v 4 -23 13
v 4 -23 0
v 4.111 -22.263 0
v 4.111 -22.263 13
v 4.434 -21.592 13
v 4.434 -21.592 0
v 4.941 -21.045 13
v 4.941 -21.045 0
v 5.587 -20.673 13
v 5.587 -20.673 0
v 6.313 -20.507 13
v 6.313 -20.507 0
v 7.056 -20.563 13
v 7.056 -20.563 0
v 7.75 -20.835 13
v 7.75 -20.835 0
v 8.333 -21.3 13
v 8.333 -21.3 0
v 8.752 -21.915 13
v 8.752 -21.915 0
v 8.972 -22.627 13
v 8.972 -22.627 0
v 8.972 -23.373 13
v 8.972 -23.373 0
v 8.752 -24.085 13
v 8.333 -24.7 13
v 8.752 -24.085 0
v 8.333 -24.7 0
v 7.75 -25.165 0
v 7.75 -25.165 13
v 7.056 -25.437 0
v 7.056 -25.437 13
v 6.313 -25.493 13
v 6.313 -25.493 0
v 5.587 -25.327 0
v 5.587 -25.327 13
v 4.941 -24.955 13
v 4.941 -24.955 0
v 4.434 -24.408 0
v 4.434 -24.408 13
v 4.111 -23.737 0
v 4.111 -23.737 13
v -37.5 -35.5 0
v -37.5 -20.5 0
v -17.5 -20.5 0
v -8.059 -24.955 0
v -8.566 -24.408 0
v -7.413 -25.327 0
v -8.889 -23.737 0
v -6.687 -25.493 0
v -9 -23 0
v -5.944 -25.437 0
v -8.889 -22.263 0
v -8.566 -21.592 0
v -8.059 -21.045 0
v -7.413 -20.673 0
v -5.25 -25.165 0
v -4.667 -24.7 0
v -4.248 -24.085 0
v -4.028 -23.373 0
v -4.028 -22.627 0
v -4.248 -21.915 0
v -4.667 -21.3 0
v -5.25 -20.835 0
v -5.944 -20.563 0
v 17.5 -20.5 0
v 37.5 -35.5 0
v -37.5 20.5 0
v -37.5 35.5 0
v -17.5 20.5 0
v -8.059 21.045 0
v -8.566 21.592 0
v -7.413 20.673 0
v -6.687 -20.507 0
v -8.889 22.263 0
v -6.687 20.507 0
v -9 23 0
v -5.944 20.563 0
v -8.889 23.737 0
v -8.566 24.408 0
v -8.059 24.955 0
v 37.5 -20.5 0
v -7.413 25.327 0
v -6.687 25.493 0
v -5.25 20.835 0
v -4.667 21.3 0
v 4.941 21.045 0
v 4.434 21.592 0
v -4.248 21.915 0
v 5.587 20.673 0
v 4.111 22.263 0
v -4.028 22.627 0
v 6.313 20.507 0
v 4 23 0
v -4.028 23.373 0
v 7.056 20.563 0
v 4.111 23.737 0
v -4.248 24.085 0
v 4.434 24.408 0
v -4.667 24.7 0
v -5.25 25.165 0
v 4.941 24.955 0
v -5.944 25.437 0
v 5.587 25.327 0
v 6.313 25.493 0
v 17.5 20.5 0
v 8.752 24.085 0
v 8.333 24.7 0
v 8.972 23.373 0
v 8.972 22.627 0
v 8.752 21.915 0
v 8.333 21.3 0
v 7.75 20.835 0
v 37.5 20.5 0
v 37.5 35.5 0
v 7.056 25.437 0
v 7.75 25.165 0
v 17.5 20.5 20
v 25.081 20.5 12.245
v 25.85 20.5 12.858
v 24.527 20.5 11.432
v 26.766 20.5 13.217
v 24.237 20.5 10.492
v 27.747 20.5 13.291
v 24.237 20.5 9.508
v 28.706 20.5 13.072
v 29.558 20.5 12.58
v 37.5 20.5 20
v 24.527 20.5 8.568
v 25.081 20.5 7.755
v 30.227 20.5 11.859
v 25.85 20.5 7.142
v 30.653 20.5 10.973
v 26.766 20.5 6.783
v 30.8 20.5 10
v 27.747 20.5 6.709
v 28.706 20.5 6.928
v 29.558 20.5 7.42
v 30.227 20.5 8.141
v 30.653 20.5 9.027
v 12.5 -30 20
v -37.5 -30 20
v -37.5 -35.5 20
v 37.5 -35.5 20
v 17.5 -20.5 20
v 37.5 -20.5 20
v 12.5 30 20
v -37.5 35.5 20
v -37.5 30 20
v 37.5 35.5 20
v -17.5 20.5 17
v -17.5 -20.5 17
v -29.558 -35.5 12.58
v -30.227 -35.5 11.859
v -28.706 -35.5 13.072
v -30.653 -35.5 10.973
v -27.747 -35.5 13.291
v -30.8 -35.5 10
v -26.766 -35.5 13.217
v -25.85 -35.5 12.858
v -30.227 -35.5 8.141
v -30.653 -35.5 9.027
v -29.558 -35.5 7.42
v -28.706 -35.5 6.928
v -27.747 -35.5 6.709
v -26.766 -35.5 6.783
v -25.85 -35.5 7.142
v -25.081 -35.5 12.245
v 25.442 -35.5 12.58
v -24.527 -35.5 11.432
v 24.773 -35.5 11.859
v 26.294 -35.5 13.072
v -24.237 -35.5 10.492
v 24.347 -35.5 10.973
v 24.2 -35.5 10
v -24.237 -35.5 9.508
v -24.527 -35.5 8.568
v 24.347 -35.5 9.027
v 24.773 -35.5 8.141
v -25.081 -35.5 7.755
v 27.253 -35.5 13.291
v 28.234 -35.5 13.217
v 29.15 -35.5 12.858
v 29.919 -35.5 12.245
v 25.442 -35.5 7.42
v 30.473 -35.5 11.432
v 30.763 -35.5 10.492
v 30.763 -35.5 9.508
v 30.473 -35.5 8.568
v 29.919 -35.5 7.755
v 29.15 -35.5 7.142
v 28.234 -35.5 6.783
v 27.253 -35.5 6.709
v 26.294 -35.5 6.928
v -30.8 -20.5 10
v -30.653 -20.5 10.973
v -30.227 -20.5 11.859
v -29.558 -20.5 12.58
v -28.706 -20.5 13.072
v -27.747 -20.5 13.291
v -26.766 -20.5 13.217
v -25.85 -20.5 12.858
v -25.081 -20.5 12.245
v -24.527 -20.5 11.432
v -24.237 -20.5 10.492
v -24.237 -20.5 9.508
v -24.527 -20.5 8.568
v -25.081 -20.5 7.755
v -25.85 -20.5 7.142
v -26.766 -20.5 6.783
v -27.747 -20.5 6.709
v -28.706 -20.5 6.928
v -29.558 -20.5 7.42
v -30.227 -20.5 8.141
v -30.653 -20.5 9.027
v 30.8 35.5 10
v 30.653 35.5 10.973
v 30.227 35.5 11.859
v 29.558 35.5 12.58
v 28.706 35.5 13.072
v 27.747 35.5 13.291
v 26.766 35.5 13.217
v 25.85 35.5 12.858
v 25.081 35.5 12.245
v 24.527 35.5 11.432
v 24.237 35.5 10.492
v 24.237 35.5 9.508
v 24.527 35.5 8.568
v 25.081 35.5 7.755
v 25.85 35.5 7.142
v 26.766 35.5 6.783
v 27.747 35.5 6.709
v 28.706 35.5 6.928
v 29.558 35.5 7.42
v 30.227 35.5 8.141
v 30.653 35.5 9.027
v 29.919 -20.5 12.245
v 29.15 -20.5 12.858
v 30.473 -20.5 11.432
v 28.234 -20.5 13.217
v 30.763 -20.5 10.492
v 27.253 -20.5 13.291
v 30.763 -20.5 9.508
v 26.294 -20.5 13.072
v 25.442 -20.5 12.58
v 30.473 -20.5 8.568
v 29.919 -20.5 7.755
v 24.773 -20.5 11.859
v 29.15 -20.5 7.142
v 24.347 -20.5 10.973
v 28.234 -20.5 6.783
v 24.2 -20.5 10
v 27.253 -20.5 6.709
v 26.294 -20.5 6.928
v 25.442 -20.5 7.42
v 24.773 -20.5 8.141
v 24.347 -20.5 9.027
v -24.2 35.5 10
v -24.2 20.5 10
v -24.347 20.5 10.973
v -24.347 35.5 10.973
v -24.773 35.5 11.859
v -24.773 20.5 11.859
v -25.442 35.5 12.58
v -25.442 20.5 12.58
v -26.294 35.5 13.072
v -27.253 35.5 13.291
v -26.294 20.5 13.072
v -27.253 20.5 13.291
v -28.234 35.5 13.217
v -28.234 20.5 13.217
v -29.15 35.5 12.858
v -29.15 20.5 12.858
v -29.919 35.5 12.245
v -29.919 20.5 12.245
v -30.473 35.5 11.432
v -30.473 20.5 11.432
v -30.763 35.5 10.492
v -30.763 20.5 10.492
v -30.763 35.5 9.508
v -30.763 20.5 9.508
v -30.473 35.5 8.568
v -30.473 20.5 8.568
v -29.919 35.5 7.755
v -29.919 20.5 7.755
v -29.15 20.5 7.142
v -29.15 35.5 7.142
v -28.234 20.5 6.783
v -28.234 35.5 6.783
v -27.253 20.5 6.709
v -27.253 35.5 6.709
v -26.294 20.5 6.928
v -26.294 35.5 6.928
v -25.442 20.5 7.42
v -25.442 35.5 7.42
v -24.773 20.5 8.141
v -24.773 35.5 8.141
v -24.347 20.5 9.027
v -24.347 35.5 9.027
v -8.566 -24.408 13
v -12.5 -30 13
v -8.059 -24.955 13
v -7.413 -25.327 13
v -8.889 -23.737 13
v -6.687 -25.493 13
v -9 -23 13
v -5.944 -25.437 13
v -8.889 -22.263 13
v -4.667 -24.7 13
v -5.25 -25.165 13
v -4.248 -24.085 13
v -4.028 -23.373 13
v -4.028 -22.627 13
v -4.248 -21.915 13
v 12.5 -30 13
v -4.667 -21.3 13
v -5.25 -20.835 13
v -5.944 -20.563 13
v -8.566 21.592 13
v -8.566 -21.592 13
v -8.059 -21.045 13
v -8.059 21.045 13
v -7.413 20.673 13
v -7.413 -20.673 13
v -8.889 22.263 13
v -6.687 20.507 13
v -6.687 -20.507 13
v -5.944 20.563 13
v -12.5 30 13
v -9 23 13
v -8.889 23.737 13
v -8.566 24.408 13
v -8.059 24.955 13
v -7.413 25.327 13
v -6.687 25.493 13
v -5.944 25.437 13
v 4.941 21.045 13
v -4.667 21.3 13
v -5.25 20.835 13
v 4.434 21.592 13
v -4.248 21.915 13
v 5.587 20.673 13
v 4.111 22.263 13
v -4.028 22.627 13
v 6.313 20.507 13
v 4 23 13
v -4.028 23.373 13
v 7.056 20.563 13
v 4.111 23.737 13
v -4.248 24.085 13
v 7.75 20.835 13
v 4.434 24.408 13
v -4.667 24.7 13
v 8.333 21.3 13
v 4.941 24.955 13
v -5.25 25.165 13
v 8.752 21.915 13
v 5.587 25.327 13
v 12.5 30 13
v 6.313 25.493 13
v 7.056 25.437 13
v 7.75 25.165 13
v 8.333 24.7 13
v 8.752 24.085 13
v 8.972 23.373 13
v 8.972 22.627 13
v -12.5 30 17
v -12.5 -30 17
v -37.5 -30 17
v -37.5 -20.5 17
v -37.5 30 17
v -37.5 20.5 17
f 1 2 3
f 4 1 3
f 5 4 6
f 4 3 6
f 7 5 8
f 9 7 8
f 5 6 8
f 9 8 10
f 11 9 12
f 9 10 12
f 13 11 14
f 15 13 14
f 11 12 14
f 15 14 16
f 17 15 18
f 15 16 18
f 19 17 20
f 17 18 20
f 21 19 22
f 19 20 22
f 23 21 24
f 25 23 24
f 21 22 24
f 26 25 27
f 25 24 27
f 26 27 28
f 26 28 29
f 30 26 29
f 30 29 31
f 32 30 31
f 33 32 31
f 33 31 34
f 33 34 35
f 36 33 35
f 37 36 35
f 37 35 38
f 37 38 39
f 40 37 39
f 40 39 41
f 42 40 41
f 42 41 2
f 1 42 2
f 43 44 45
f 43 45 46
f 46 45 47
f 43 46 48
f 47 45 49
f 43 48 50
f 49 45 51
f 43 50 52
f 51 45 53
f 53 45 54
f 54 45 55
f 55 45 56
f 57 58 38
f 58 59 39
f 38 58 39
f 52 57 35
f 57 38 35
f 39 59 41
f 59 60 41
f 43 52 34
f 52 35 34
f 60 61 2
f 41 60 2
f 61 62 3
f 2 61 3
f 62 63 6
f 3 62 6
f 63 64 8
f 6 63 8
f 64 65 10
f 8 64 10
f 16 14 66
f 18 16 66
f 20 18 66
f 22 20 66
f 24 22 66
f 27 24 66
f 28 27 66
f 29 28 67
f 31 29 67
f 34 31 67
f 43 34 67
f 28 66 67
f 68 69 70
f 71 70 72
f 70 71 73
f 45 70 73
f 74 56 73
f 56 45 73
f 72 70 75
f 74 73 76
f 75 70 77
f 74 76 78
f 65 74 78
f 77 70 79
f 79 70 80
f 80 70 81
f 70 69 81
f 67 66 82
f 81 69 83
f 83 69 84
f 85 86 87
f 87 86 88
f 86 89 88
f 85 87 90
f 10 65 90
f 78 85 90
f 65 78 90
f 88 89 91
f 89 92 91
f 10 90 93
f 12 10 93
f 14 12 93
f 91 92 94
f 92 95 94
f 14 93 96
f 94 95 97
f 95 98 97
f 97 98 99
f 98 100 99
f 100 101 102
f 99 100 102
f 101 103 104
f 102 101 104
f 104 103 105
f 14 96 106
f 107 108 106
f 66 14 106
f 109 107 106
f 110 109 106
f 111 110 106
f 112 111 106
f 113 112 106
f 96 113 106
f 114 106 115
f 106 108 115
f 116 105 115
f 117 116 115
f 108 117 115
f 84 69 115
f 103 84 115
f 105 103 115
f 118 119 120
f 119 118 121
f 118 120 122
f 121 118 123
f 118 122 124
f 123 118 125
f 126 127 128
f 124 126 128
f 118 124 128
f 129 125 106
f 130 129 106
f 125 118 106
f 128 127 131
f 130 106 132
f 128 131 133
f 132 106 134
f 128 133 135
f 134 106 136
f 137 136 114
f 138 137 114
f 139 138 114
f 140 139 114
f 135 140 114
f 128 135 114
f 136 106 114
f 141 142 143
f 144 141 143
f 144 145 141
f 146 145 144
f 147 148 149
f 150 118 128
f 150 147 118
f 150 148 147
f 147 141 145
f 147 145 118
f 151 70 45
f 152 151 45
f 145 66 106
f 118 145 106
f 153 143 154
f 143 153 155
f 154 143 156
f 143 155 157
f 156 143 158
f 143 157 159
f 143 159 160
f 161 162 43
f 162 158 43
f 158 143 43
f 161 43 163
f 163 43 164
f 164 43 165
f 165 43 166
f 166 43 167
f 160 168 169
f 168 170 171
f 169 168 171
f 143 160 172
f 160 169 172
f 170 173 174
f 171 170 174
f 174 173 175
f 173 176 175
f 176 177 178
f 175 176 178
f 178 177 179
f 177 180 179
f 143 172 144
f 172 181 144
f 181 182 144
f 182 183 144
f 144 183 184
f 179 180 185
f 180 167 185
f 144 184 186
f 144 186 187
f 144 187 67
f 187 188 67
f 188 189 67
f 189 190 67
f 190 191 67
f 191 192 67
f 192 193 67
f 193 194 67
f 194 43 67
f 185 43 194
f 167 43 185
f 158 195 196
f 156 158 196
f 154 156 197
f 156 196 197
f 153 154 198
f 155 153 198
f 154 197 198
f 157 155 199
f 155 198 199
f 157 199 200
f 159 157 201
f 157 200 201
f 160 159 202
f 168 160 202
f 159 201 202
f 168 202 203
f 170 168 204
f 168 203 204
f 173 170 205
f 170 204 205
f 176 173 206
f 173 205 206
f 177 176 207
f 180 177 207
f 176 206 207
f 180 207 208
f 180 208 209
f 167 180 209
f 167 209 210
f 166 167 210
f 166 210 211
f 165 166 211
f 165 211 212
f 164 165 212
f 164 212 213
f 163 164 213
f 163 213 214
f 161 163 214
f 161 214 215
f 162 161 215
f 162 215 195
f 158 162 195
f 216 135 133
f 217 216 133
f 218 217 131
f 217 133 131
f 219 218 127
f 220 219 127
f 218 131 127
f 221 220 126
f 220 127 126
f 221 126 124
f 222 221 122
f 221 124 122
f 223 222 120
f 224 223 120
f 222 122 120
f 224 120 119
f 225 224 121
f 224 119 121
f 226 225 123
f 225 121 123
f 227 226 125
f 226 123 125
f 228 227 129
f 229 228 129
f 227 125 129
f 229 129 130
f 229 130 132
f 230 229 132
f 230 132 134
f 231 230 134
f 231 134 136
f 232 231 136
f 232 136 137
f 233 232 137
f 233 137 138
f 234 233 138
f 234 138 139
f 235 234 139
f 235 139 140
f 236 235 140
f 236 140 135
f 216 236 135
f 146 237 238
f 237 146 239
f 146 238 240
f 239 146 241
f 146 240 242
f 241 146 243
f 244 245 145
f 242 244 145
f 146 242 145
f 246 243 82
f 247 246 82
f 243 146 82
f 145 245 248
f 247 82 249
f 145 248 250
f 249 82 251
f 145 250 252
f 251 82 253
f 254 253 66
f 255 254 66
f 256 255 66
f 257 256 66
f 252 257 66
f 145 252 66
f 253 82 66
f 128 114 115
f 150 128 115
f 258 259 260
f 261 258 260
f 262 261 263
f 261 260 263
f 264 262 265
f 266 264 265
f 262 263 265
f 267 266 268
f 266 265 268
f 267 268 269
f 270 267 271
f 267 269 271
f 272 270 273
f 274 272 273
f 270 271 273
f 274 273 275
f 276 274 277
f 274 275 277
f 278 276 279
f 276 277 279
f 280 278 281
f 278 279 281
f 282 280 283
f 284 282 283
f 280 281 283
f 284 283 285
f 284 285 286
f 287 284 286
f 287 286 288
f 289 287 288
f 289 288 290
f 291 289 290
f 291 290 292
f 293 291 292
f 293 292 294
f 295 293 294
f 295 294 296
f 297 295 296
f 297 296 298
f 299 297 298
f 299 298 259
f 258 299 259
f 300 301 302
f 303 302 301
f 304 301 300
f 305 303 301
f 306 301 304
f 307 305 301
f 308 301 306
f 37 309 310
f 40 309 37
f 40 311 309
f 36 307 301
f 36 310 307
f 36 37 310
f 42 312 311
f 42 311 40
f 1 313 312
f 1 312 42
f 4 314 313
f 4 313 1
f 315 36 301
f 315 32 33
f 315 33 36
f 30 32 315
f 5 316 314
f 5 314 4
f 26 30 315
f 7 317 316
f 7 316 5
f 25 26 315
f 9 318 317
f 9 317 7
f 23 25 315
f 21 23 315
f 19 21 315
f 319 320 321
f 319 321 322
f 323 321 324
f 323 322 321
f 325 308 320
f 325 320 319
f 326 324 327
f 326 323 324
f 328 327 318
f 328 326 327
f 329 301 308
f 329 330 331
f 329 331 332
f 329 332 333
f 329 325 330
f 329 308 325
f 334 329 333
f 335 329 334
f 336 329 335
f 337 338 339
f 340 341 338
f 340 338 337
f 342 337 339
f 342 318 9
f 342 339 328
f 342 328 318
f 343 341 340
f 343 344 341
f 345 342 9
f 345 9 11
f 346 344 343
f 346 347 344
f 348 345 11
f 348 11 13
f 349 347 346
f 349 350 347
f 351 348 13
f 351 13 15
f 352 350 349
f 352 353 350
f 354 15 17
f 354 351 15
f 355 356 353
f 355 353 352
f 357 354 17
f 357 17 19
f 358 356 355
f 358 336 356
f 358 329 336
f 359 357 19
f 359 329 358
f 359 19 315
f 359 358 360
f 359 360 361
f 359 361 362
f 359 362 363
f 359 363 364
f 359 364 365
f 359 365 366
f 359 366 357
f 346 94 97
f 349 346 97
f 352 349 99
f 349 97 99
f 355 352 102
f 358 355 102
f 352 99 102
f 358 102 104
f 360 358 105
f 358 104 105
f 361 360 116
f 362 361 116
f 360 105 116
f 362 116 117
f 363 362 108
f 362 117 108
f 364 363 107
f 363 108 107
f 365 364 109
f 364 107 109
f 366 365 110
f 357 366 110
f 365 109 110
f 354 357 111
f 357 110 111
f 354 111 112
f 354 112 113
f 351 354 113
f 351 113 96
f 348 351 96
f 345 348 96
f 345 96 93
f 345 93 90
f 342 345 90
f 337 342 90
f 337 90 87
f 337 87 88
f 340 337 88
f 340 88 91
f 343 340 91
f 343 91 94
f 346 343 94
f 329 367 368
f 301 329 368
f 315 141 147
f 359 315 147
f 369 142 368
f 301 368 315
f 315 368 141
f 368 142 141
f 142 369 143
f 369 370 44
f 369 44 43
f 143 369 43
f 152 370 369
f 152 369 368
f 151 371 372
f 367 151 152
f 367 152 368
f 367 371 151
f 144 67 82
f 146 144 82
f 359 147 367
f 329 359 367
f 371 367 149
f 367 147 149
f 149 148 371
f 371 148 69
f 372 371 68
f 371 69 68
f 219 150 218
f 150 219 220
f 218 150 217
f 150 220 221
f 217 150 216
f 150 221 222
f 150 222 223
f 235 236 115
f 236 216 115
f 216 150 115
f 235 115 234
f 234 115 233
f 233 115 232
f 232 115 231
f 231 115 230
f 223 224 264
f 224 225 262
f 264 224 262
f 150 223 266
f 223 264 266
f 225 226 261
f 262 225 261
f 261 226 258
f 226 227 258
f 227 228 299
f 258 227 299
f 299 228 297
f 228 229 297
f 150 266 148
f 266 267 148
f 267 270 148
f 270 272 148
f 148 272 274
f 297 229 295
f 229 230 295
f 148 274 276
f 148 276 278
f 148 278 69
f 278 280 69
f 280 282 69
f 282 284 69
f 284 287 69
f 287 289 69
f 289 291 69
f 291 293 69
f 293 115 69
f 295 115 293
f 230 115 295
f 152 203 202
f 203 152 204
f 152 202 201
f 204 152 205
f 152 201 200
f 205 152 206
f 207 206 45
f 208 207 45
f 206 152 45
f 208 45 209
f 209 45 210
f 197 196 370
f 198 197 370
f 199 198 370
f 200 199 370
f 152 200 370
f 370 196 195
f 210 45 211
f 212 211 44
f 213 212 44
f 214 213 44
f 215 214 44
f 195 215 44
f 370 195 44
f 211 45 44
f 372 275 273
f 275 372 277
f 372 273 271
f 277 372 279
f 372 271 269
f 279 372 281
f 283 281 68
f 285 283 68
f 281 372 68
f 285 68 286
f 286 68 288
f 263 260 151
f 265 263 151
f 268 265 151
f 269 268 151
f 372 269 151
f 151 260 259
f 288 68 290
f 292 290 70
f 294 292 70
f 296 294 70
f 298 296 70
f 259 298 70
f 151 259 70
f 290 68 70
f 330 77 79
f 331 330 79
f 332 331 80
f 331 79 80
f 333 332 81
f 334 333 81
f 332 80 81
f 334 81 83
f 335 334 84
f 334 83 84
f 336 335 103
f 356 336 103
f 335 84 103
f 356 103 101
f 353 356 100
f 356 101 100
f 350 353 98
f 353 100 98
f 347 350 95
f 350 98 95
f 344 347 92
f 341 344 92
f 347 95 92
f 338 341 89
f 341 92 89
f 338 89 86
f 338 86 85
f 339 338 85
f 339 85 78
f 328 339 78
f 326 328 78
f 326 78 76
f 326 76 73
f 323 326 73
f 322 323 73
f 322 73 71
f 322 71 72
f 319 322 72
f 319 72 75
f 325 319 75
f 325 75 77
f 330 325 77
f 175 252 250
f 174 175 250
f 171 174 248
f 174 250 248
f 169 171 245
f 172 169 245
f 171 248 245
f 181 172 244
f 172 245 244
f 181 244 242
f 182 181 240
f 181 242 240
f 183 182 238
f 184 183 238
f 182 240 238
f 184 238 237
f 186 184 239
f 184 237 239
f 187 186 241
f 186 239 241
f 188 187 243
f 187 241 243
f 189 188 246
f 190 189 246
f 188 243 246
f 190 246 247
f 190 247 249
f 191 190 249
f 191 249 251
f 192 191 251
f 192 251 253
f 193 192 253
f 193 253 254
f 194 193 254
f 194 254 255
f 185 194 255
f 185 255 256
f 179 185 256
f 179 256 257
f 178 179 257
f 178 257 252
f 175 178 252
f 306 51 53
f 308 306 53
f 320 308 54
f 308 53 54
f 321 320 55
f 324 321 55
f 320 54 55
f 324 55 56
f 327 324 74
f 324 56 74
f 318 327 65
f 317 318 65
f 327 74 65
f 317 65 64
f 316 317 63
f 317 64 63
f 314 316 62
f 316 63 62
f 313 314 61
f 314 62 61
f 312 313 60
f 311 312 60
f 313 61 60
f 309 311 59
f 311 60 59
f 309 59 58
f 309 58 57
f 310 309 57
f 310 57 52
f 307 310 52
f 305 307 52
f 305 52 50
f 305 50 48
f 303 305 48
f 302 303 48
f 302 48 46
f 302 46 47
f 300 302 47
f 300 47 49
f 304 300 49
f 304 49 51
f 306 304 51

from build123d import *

# Parameters (mm, degrees)
F1_DEPTH       = 20
F2_W           = 12.5
F2_H           = 30
F3_DEPTH       = 7
F4_DEPTH       = 3
F7_D           = 6.6
F7_DEPTH       = 15.001
F7_ON_F5_D     = 6.6
F7_ON_F5_DEPTH = 15.001
F9_D           = 5


with BuildPart() as f1:
    # F0 (on Top) → F1 (new body)
    with BuildSketch(Plane.XY):
        Polygon((37.5, 35.5), (-37.5, 35.5), (-37.5, 20.5), (-17.5, 20.5), (-17.5, 0), (-17.5, -20.5), (-37.5, -20.5), (-37.5, -35.5), (37.5, -35.5), (37.5, -20.5), (17.5, -20.5), (17.5, 0), (17.5, 20.5), (37.5, 20.5), align=None)
    extrude(amount=F1_DEPTH)

    # F2 (on face) → F3 (cut)
    with BuildSketch(Plane.XY.offset(20)):
        with Locations((-6.25, 15)):
            Rectangle(F2_W, F2_H)
        Polygon((0, 30), (0, 0), (-12.5, 0), (-12.5, -30), (0, -30), (12.5, -30), (12.5, 0), (12.5, 30), align=None)
    extrude(amount=-F3_DEPTH, mode=Mode.SUBTRACT)

    # F2 (on face) → F4 (cut)
    with BuildSketch(Plane.XY.offset(20)):
        Polygon((-12.5, -30), (-12.5, 0), (-12.5, 30), (-37.5, 30), (-37.5, 20.5), (-17.5, 20.5), (-17.5, -20.5), (-37.5, -20.5), (-37.5, -30), align=None)
    extrude(amount=-F4_DEPTH, mode=Mode.SUBTRACT)

    # F7 (through all, one way)
    with BuildSketch(Plane(origin=(0, -20.5, 0), x_dir=(-1, 0, 0), z_dir=(0, 1, 0))):
        with Locations((27.5, 10), (-27.5, 10)):
            Circle(F7_D / 2)
    extrude(amount=-F7_DEPTH, mode=Mode.SUBTRACT)

    # F7 on F5 (through all, one way)
    with BuildSketch(Plane.XZ.offset(-20.5)):
        with Locations((-27.5, 10), (27.5, 10)):
            Circle(F7_ON_F5_D / 2)
    extrude(amount=-F7_ON_F5_DEPTH, mode=Mode.SUBTRACT)

    # F9 (through all)
    with Locations(Plane.XY.offset(20)):
        with Locations((-6.5, 23), (6.5, 23), (6.5, -23), (-6.5, -23)):
            Hole(F9_D / 2)


solid = f1.part
